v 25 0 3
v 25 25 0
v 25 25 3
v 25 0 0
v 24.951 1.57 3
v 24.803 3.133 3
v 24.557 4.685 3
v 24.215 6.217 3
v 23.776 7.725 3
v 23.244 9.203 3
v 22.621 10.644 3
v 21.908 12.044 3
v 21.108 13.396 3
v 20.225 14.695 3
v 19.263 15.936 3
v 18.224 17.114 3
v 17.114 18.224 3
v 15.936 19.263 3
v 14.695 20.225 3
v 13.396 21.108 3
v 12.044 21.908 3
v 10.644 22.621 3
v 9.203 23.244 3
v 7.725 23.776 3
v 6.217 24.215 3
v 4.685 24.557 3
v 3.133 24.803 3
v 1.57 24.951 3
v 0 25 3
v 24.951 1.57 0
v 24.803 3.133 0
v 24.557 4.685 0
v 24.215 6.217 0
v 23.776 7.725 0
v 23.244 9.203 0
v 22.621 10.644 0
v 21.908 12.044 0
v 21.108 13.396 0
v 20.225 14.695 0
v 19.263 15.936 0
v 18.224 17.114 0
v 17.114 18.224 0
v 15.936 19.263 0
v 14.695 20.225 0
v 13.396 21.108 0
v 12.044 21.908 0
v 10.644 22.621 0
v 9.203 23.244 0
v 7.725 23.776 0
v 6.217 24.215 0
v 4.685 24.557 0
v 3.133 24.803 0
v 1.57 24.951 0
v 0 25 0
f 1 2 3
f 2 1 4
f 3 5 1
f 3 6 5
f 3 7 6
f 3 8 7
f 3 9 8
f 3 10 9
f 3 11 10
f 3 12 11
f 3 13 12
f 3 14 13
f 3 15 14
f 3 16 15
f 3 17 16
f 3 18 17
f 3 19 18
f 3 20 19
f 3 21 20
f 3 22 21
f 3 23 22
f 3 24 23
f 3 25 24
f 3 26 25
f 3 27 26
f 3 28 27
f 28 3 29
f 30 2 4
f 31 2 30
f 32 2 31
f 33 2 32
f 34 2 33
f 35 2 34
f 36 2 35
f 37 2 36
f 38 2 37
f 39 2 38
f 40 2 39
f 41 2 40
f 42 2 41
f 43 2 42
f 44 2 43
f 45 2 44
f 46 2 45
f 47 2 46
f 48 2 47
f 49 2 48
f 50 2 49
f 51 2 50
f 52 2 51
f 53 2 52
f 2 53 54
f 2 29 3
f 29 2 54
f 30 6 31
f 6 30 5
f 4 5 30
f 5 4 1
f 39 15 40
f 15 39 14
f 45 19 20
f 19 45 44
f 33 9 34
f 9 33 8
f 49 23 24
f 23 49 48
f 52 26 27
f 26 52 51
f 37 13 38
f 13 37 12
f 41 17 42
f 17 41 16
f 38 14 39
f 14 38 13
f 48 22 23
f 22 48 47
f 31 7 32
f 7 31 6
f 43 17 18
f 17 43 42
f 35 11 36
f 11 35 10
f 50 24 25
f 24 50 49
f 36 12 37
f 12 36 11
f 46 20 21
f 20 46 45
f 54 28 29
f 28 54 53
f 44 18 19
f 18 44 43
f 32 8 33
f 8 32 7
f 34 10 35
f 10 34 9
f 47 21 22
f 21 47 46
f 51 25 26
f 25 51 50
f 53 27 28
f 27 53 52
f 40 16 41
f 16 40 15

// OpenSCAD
$fn = 100;

//difference(){
//    union(){
//        difference(){
//       
//                cube([15,39,23]);
//
//            
//            for (i = [1:2:38]){
//                translate([-5,i,-1]){
//                    cube([20,1,21]);
//                }
//            }
//        }
//        
//                    difference(){
//            translate([0,34,20]){
//               cube([40,5,11]);
//            }
//        
//            translate([30,40.9,20.9]){
//               cube([11,3.1,9.1]);
//            }
//            }
//        
//
//        
// 
//    }
//    
//    
//
//
//
//    
//    
//
//    
//    translate([5,50,53]){
//        rotate([90,0,0]){
//           cylinder(h = 50, d = 61);
//        }
//    }
//}

arch();

module arch(){

    difference(){
        cube([25,25,3]);
        translate([0,0,-2]){
           cylinder(h=50,d=50);
        }
    }
}







        
        
